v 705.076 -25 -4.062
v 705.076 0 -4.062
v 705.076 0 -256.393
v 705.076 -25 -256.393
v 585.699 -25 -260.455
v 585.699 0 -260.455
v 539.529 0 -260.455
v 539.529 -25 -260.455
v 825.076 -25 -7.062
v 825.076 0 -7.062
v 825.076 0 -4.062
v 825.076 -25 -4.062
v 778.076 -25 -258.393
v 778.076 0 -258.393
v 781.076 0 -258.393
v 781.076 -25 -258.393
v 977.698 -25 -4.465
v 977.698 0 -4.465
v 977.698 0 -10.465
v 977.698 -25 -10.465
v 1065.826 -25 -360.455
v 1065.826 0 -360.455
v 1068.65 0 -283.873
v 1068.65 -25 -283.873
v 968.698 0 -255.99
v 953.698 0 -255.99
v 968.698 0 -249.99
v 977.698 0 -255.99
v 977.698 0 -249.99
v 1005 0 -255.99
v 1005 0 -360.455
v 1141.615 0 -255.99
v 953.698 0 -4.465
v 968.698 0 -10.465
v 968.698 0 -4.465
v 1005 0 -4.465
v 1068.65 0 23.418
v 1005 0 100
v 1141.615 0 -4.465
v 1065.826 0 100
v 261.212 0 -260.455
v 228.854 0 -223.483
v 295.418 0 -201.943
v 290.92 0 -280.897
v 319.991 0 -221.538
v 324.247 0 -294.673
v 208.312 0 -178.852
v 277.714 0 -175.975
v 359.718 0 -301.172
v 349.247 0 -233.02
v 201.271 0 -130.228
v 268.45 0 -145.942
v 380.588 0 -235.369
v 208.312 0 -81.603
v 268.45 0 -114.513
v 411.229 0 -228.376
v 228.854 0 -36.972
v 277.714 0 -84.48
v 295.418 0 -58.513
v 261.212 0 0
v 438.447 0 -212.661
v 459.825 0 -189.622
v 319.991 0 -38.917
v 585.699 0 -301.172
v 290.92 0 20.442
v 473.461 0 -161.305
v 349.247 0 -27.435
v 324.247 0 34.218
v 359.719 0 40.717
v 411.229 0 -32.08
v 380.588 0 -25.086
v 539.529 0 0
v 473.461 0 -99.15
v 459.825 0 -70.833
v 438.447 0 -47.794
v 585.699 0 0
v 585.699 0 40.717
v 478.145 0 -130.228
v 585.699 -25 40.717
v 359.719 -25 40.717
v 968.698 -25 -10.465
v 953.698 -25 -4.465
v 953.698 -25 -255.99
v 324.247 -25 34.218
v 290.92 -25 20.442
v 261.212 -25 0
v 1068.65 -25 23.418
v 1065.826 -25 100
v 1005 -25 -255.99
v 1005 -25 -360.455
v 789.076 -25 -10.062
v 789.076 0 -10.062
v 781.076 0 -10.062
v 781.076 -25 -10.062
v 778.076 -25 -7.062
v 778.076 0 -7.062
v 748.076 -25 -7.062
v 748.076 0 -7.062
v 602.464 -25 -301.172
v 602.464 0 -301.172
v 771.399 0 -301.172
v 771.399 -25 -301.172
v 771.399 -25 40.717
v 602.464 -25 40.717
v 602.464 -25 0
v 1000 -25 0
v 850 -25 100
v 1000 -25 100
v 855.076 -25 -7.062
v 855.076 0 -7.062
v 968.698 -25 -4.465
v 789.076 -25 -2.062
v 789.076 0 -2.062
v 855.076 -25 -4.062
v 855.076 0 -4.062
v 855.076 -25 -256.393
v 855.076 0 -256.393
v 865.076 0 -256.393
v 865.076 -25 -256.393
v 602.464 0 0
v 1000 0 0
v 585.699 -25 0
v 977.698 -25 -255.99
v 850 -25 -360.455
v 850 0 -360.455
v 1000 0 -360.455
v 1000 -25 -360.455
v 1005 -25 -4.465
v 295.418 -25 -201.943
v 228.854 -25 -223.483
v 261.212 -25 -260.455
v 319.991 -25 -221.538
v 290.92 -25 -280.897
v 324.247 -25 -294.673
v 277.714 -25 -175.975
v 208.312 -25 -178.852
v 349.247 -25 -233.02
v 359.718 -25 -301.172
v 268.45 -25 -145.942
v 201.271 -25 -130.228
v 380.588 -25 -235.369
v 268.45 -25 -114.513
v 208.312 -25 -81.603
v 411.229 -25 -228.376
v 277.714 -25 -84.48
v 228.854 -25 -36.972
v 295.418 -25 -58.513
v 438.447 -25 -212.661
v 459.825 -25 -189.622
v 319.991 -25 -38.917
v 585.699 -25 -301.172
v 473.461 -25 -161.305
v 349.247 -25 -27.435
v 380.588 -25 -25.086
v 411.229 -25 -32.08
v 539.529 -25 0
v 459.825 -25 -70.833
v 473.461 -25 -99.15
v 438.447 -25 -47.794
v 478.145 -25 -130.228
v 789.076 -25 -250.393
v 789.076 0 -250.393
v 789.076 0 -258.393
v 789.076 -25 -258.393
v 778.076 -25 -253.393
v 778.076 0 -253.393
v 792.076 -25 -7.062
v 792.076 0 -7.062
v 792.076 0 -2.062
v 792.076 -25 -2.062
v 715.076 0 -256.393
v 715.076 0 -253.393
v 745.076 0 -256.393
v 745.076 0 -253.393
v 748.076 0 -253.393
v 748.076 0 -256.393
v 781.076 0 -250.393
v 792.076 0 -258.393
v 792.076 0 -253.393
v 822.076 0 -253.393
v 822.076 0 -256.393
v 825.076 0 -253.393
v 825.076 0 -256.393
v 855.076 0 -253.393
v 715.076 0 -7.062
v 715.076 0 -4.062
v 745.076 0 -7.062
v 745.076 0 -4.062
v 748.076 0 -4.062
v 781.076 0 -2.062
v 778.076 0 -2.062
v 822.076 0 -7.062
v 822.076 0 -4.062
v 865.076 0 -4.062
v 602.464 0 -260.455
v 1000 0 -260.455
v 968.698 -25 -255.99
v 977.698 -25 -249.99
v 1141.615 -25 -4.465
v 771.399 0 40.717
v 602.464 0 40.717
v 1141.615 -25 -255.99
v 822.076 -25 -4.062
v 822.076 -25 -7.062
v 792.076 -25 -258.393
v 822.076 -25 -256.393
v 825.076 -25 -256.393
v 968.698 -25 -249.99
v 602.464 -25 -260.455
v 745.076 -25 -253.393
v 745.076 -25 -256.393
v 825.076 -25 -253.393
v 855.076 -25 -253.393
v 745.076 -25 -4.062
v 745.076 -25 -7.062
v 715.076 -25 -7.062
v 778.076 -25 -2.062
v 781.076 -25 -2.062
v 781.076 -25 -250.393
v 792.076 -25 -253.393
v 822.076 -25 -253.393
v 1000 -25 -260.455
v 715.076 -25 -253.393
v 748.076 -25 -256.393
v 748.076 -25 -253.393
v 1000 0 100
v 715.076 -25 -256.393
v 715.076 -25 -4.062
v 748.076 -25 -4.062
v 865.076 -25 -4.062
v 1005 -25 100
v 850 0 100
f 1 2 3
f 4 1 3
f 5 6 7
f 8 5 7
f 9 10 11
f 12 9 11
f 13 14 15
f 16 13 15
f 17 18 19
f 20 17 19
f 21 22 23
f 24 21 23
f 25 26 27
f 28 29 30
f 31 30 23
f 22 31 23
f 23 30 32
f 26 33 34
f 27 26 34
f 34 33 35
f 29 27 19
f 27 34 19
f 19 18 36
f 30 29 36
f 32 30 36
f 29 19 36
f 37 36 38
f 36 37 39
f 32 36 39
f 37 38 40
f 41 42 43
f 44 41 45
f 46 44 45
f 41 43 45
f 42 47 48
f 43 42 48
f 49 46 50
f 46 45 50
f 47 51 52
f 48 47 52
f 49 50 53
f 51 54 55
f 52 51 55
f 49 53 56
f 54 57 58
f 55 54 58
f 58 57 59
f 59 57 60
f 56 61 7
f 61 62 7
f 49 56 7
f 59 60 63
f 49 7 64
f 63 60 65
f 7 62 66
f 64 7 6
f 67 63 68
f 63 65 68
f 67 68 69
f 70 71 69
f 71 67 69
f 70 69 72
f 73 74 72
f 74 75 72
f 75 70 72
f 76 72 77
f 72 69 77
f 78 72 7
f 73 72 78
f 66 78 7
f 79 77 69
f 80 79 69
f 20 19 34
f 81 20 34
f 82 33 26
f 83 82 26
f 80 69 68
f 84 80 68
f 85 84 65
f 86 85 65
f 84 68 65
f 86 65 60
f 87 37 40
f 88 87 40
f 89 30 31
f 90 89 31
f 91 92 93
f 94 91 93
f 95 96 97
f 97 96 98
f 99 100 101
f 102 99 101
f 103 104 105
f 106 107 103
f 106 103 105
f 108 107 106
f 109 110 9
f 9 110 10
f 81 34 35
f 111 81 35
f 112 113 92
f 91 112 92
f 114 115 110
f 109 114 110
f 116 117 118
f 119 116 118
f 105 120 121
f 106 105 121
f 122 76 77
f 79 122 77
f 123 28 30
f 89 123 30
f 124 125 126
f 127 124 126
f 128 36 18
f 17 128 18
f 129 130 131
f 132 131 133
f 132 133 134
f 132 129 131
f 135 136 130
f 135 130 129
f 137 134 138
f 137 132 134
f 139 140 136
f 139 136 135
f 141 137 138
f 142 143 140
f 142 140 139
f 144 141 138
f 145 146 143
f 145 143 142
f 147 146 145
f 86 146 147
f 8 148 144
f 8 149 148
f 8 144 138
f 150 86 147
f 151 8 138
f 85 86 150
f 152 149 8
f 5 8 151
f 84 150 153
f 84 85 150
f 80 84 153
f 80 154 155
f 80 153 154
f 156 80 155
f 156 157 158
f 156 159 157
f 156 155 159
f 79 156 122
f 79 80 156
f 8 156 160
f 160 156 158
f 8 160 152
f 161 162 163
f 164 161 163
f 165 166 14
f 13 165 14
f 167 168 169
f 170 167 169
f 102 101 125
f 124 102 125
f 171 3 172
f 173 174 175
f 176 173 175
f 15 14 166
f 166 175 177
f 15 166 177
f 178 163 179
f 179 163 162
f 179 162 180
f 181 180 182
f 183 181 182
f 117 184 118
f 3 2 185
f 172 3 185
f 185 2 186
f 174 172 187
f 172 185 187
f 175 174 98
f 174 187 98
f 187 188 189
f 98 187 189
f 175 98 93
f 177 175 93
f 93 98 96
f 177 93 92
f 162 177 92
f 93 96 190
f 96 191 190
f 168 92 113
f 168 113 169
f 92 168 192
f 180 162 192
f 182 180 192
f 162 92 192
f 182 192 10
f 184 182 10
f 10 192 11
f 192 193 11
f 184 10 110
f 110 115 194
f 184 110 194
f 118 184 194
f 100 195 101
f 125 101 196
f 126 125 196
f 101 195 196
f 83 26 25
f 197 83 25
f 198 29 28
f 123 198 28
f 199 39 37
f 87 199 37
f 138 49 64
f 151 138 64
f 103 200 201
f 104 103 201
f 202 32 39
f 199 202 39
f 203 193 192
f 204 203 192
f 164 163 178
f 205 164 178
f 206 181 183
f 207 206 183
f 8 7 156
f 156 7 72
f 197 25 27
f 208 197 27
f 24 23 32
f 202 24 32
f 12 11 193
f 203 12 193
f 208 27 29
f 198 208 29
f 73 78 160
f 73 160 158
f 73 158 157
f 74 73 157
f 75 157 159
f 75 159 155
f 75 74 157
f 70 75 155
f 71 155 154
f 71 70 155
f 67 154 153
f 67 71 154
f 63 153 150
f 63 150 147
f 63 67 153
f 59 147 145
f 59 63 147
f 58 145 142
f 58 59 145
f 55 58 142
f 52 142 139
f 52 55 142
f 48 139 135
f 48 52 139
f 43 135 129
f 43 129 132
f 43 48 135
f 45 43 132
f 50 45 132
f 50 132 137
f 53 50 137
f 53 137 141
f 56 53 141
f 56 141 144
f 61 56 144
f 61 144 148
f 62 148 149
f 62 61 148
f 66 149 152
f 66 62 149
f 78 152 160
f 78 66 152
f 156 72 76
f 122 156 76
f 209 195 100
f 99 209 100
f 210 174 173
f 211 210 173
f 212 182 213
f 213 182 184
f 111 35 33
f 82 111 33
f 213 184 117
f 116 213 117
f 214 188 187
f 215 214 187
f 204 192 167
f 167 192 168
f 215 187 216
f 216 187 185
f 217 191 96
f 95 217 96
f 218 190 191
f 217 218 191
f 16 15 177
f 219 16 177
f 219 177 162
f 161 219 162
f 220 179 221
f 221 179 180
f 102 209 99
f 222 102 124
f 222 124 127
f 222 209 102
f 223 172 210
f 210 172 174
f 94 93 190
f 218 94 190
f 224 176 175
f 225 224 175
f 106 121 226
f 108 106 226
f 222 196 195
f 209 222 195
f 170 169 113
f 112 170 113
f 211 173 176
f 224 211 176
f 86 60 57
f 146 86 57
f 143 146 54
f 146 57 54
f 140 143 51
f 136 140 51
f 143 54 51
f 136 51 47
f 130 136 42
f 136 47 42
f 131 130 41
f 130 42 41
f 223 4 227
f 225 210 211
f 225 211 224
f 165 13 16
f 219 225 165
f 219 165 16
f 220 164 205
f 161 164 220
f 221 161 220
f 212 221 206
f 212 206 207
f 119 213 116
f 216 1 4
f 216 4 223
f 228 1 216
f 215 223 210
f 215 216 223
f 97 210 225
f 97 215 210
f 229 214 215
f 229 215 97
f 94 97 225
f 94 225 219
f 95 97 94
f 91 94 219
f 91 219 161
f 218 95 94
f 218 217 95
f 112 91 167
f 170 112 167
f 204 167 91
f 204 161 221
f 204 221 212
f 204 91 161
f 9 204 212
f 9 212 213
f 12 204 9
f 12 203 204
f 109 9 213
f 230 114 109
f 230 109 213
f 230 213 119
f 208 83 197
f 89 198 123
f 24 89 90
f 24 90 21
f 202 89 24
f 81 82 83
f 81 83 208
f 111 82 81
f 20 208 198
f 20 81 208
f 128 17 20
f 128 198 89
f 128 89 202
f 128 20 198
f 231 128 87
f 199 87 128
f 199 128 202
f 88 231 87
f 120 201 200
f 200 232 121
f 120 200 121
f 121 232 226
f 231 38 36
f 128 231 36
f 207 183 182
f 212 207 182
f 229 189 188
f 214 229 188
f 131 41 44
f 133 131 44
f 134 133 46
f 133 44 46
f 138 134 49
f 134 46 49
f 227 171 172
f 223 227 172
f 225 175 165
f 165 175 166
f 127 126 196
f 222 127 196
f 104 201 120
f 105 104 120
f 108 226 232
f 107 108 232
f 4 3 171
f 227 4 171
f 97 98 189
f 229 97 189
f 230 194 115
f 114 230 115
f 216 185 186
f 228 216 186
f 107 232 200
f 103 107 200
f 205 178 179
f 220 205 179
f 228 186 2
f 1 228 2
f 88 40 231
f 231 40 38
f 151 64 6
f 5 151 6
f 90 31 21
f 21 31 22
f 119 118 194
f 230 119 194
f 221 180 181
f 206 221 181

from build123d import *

# Parameters (mm, degrees)
F1_DEPTH = 25
F0_R     = 105.436405
F2_DEPTH = 25


with BuildPart() as f1:
    # F0 (on Front) → F1 (new body)
    with BuildSketch(Plane.XZ):
        Polygon((705.075502, -4.062413), (705.075502, -130.227521), (705.075502, -256.392629), (715.075502, -256.392629), (715.075502, -253.392629), (745.075502, -253.392629), (745.075502, -256.392629), (748.075502, -256.392629), (748.075502, -253.392629), (778.075502, -253.392629), (778.075502, -258.392629), (781.075502, -258.392629), (781.075502, -250.392629), (789.075502, -250.392629), (789.075502, -258.392629), (792.075502, -258.392629), (792.075502, -253.392629), (822.075502, -253.392629), (822.075502, -256.392629), (825.075502, -256.392629), (825.075502, -253.392629), (855.075502, -253.392629), (855.075502, -256.392629), (865.075502, -256.392629), (865.075502, -130.227521), (865.075502, -4.062413), (855.075502, -4.062413), (855.075502, -7.062413), (825.075502, -7.062413), (825.075502, -4.062413), (822.075502, -4.062413), (822.075502, -7.062413), (792.075502, -7.062413), (792.075502, -2.062413), (789.075502, -2.062413), (789.075502, -10.062413), (781.075502, -10.062413), (781.075502, -2.062413), (778.075502, -2.062413), (778.075502, -7.062413), (748.075502, -7.062413), (748.075502, -4.062413), (745.075502, -4.062413), (745.075502, -7.062413), (715.075502, -7.062413), (715.075502, -4.062413), align=None)
        Polygon((1000, -260.455042), (602.46402, -260.455042), (602.46402, -301.172042), (771.398842, -301.172042), (850, -360.455042), (1000, -360.455042), align=None)
        Polygon((953.698397, -4.465473), (953.698397, -130.227521), (953.698397, -255.989569), (968.698397, -255.989569), (968.698397, -249.989569), (977.698397, -249.989569), (977.698397, -255.989569), (1005, -255.989569), (1005, -360.455042), (1065.825701, -360.455042), (1068.650246, -283.873346), (1141.615189, -255.989569), (1141.615189, -130.227521), (1141.615189, -4.465473), (1068.650246, 23.418304), (1065.825701, 100), (1005, 100), (1005, -4.465473), (977.698397, -4.465473), (977.698397, -10.465473), (968.698397, -10.465473), (968.698397, -4.465473), align=None)
        Polygon((602.46402, 40.717), (602.46402, 0), (1000, 0), (1000, 100), (850, 100), (771.398842, 40.717), align=None)
    extrude(amount=F1_DEPTH)


with BuildPart() as f2:
    # F0 (on Front) → F2 (new body)
    with BuildSketch(Plane.XZ):
        with BuildLine():
            Line((539.529026, -260.455042), (539.529026, 0))
            Line((539.529026, 0), (261.211913, 0))
            ThreePointArc((261.211913, 0), (201.271463, -130.227513), (261.211878, -260.455042))
            Line((261.211878, -260.455042), (539.529026, -260.455042))
        make_face()
        with Locations((372.708854, -130.227536)):
            Circle(F0_R, mode=Mode.SUBTRACT)
        with BuildLine():
            Line((261.211913, 0), (539.529026, 0))
            Line((539.529026, 0), (585.699026, 0))
            Line((585.699026, 0), (585.699026, 40.717))
            Line((585.699026, 40.717), (385.699026, 40.717))
            Line((385.699026, 40.717), (359.718682, 40.717))
            ThreePointArc((359.718682, 40.717), (307.220467, 28.208729), (261.211913, 0))
        make_face()
        with BuildLine():
            Line((585.699421, -260.455042), (539.529026, -260.455042))
            Line((539.529026, -260.455042), (261.211878, -260.455042))
            ThreePointArc((261.211878, -260.455042), (307.220262, -288.663717), (359.718287, -301.172042))
            Line((359.718287, -301.172042), (385.699421, -301.172042))
            Line((385.699421, -301.172042), (585.699421, -301.172042))
            Line((585.699421, -301.172042), (585.699421, -260.455042))
        make_face()
    extrude(amount=F2_DEPTH)


solid = Compound([f1.part, f2.part])
